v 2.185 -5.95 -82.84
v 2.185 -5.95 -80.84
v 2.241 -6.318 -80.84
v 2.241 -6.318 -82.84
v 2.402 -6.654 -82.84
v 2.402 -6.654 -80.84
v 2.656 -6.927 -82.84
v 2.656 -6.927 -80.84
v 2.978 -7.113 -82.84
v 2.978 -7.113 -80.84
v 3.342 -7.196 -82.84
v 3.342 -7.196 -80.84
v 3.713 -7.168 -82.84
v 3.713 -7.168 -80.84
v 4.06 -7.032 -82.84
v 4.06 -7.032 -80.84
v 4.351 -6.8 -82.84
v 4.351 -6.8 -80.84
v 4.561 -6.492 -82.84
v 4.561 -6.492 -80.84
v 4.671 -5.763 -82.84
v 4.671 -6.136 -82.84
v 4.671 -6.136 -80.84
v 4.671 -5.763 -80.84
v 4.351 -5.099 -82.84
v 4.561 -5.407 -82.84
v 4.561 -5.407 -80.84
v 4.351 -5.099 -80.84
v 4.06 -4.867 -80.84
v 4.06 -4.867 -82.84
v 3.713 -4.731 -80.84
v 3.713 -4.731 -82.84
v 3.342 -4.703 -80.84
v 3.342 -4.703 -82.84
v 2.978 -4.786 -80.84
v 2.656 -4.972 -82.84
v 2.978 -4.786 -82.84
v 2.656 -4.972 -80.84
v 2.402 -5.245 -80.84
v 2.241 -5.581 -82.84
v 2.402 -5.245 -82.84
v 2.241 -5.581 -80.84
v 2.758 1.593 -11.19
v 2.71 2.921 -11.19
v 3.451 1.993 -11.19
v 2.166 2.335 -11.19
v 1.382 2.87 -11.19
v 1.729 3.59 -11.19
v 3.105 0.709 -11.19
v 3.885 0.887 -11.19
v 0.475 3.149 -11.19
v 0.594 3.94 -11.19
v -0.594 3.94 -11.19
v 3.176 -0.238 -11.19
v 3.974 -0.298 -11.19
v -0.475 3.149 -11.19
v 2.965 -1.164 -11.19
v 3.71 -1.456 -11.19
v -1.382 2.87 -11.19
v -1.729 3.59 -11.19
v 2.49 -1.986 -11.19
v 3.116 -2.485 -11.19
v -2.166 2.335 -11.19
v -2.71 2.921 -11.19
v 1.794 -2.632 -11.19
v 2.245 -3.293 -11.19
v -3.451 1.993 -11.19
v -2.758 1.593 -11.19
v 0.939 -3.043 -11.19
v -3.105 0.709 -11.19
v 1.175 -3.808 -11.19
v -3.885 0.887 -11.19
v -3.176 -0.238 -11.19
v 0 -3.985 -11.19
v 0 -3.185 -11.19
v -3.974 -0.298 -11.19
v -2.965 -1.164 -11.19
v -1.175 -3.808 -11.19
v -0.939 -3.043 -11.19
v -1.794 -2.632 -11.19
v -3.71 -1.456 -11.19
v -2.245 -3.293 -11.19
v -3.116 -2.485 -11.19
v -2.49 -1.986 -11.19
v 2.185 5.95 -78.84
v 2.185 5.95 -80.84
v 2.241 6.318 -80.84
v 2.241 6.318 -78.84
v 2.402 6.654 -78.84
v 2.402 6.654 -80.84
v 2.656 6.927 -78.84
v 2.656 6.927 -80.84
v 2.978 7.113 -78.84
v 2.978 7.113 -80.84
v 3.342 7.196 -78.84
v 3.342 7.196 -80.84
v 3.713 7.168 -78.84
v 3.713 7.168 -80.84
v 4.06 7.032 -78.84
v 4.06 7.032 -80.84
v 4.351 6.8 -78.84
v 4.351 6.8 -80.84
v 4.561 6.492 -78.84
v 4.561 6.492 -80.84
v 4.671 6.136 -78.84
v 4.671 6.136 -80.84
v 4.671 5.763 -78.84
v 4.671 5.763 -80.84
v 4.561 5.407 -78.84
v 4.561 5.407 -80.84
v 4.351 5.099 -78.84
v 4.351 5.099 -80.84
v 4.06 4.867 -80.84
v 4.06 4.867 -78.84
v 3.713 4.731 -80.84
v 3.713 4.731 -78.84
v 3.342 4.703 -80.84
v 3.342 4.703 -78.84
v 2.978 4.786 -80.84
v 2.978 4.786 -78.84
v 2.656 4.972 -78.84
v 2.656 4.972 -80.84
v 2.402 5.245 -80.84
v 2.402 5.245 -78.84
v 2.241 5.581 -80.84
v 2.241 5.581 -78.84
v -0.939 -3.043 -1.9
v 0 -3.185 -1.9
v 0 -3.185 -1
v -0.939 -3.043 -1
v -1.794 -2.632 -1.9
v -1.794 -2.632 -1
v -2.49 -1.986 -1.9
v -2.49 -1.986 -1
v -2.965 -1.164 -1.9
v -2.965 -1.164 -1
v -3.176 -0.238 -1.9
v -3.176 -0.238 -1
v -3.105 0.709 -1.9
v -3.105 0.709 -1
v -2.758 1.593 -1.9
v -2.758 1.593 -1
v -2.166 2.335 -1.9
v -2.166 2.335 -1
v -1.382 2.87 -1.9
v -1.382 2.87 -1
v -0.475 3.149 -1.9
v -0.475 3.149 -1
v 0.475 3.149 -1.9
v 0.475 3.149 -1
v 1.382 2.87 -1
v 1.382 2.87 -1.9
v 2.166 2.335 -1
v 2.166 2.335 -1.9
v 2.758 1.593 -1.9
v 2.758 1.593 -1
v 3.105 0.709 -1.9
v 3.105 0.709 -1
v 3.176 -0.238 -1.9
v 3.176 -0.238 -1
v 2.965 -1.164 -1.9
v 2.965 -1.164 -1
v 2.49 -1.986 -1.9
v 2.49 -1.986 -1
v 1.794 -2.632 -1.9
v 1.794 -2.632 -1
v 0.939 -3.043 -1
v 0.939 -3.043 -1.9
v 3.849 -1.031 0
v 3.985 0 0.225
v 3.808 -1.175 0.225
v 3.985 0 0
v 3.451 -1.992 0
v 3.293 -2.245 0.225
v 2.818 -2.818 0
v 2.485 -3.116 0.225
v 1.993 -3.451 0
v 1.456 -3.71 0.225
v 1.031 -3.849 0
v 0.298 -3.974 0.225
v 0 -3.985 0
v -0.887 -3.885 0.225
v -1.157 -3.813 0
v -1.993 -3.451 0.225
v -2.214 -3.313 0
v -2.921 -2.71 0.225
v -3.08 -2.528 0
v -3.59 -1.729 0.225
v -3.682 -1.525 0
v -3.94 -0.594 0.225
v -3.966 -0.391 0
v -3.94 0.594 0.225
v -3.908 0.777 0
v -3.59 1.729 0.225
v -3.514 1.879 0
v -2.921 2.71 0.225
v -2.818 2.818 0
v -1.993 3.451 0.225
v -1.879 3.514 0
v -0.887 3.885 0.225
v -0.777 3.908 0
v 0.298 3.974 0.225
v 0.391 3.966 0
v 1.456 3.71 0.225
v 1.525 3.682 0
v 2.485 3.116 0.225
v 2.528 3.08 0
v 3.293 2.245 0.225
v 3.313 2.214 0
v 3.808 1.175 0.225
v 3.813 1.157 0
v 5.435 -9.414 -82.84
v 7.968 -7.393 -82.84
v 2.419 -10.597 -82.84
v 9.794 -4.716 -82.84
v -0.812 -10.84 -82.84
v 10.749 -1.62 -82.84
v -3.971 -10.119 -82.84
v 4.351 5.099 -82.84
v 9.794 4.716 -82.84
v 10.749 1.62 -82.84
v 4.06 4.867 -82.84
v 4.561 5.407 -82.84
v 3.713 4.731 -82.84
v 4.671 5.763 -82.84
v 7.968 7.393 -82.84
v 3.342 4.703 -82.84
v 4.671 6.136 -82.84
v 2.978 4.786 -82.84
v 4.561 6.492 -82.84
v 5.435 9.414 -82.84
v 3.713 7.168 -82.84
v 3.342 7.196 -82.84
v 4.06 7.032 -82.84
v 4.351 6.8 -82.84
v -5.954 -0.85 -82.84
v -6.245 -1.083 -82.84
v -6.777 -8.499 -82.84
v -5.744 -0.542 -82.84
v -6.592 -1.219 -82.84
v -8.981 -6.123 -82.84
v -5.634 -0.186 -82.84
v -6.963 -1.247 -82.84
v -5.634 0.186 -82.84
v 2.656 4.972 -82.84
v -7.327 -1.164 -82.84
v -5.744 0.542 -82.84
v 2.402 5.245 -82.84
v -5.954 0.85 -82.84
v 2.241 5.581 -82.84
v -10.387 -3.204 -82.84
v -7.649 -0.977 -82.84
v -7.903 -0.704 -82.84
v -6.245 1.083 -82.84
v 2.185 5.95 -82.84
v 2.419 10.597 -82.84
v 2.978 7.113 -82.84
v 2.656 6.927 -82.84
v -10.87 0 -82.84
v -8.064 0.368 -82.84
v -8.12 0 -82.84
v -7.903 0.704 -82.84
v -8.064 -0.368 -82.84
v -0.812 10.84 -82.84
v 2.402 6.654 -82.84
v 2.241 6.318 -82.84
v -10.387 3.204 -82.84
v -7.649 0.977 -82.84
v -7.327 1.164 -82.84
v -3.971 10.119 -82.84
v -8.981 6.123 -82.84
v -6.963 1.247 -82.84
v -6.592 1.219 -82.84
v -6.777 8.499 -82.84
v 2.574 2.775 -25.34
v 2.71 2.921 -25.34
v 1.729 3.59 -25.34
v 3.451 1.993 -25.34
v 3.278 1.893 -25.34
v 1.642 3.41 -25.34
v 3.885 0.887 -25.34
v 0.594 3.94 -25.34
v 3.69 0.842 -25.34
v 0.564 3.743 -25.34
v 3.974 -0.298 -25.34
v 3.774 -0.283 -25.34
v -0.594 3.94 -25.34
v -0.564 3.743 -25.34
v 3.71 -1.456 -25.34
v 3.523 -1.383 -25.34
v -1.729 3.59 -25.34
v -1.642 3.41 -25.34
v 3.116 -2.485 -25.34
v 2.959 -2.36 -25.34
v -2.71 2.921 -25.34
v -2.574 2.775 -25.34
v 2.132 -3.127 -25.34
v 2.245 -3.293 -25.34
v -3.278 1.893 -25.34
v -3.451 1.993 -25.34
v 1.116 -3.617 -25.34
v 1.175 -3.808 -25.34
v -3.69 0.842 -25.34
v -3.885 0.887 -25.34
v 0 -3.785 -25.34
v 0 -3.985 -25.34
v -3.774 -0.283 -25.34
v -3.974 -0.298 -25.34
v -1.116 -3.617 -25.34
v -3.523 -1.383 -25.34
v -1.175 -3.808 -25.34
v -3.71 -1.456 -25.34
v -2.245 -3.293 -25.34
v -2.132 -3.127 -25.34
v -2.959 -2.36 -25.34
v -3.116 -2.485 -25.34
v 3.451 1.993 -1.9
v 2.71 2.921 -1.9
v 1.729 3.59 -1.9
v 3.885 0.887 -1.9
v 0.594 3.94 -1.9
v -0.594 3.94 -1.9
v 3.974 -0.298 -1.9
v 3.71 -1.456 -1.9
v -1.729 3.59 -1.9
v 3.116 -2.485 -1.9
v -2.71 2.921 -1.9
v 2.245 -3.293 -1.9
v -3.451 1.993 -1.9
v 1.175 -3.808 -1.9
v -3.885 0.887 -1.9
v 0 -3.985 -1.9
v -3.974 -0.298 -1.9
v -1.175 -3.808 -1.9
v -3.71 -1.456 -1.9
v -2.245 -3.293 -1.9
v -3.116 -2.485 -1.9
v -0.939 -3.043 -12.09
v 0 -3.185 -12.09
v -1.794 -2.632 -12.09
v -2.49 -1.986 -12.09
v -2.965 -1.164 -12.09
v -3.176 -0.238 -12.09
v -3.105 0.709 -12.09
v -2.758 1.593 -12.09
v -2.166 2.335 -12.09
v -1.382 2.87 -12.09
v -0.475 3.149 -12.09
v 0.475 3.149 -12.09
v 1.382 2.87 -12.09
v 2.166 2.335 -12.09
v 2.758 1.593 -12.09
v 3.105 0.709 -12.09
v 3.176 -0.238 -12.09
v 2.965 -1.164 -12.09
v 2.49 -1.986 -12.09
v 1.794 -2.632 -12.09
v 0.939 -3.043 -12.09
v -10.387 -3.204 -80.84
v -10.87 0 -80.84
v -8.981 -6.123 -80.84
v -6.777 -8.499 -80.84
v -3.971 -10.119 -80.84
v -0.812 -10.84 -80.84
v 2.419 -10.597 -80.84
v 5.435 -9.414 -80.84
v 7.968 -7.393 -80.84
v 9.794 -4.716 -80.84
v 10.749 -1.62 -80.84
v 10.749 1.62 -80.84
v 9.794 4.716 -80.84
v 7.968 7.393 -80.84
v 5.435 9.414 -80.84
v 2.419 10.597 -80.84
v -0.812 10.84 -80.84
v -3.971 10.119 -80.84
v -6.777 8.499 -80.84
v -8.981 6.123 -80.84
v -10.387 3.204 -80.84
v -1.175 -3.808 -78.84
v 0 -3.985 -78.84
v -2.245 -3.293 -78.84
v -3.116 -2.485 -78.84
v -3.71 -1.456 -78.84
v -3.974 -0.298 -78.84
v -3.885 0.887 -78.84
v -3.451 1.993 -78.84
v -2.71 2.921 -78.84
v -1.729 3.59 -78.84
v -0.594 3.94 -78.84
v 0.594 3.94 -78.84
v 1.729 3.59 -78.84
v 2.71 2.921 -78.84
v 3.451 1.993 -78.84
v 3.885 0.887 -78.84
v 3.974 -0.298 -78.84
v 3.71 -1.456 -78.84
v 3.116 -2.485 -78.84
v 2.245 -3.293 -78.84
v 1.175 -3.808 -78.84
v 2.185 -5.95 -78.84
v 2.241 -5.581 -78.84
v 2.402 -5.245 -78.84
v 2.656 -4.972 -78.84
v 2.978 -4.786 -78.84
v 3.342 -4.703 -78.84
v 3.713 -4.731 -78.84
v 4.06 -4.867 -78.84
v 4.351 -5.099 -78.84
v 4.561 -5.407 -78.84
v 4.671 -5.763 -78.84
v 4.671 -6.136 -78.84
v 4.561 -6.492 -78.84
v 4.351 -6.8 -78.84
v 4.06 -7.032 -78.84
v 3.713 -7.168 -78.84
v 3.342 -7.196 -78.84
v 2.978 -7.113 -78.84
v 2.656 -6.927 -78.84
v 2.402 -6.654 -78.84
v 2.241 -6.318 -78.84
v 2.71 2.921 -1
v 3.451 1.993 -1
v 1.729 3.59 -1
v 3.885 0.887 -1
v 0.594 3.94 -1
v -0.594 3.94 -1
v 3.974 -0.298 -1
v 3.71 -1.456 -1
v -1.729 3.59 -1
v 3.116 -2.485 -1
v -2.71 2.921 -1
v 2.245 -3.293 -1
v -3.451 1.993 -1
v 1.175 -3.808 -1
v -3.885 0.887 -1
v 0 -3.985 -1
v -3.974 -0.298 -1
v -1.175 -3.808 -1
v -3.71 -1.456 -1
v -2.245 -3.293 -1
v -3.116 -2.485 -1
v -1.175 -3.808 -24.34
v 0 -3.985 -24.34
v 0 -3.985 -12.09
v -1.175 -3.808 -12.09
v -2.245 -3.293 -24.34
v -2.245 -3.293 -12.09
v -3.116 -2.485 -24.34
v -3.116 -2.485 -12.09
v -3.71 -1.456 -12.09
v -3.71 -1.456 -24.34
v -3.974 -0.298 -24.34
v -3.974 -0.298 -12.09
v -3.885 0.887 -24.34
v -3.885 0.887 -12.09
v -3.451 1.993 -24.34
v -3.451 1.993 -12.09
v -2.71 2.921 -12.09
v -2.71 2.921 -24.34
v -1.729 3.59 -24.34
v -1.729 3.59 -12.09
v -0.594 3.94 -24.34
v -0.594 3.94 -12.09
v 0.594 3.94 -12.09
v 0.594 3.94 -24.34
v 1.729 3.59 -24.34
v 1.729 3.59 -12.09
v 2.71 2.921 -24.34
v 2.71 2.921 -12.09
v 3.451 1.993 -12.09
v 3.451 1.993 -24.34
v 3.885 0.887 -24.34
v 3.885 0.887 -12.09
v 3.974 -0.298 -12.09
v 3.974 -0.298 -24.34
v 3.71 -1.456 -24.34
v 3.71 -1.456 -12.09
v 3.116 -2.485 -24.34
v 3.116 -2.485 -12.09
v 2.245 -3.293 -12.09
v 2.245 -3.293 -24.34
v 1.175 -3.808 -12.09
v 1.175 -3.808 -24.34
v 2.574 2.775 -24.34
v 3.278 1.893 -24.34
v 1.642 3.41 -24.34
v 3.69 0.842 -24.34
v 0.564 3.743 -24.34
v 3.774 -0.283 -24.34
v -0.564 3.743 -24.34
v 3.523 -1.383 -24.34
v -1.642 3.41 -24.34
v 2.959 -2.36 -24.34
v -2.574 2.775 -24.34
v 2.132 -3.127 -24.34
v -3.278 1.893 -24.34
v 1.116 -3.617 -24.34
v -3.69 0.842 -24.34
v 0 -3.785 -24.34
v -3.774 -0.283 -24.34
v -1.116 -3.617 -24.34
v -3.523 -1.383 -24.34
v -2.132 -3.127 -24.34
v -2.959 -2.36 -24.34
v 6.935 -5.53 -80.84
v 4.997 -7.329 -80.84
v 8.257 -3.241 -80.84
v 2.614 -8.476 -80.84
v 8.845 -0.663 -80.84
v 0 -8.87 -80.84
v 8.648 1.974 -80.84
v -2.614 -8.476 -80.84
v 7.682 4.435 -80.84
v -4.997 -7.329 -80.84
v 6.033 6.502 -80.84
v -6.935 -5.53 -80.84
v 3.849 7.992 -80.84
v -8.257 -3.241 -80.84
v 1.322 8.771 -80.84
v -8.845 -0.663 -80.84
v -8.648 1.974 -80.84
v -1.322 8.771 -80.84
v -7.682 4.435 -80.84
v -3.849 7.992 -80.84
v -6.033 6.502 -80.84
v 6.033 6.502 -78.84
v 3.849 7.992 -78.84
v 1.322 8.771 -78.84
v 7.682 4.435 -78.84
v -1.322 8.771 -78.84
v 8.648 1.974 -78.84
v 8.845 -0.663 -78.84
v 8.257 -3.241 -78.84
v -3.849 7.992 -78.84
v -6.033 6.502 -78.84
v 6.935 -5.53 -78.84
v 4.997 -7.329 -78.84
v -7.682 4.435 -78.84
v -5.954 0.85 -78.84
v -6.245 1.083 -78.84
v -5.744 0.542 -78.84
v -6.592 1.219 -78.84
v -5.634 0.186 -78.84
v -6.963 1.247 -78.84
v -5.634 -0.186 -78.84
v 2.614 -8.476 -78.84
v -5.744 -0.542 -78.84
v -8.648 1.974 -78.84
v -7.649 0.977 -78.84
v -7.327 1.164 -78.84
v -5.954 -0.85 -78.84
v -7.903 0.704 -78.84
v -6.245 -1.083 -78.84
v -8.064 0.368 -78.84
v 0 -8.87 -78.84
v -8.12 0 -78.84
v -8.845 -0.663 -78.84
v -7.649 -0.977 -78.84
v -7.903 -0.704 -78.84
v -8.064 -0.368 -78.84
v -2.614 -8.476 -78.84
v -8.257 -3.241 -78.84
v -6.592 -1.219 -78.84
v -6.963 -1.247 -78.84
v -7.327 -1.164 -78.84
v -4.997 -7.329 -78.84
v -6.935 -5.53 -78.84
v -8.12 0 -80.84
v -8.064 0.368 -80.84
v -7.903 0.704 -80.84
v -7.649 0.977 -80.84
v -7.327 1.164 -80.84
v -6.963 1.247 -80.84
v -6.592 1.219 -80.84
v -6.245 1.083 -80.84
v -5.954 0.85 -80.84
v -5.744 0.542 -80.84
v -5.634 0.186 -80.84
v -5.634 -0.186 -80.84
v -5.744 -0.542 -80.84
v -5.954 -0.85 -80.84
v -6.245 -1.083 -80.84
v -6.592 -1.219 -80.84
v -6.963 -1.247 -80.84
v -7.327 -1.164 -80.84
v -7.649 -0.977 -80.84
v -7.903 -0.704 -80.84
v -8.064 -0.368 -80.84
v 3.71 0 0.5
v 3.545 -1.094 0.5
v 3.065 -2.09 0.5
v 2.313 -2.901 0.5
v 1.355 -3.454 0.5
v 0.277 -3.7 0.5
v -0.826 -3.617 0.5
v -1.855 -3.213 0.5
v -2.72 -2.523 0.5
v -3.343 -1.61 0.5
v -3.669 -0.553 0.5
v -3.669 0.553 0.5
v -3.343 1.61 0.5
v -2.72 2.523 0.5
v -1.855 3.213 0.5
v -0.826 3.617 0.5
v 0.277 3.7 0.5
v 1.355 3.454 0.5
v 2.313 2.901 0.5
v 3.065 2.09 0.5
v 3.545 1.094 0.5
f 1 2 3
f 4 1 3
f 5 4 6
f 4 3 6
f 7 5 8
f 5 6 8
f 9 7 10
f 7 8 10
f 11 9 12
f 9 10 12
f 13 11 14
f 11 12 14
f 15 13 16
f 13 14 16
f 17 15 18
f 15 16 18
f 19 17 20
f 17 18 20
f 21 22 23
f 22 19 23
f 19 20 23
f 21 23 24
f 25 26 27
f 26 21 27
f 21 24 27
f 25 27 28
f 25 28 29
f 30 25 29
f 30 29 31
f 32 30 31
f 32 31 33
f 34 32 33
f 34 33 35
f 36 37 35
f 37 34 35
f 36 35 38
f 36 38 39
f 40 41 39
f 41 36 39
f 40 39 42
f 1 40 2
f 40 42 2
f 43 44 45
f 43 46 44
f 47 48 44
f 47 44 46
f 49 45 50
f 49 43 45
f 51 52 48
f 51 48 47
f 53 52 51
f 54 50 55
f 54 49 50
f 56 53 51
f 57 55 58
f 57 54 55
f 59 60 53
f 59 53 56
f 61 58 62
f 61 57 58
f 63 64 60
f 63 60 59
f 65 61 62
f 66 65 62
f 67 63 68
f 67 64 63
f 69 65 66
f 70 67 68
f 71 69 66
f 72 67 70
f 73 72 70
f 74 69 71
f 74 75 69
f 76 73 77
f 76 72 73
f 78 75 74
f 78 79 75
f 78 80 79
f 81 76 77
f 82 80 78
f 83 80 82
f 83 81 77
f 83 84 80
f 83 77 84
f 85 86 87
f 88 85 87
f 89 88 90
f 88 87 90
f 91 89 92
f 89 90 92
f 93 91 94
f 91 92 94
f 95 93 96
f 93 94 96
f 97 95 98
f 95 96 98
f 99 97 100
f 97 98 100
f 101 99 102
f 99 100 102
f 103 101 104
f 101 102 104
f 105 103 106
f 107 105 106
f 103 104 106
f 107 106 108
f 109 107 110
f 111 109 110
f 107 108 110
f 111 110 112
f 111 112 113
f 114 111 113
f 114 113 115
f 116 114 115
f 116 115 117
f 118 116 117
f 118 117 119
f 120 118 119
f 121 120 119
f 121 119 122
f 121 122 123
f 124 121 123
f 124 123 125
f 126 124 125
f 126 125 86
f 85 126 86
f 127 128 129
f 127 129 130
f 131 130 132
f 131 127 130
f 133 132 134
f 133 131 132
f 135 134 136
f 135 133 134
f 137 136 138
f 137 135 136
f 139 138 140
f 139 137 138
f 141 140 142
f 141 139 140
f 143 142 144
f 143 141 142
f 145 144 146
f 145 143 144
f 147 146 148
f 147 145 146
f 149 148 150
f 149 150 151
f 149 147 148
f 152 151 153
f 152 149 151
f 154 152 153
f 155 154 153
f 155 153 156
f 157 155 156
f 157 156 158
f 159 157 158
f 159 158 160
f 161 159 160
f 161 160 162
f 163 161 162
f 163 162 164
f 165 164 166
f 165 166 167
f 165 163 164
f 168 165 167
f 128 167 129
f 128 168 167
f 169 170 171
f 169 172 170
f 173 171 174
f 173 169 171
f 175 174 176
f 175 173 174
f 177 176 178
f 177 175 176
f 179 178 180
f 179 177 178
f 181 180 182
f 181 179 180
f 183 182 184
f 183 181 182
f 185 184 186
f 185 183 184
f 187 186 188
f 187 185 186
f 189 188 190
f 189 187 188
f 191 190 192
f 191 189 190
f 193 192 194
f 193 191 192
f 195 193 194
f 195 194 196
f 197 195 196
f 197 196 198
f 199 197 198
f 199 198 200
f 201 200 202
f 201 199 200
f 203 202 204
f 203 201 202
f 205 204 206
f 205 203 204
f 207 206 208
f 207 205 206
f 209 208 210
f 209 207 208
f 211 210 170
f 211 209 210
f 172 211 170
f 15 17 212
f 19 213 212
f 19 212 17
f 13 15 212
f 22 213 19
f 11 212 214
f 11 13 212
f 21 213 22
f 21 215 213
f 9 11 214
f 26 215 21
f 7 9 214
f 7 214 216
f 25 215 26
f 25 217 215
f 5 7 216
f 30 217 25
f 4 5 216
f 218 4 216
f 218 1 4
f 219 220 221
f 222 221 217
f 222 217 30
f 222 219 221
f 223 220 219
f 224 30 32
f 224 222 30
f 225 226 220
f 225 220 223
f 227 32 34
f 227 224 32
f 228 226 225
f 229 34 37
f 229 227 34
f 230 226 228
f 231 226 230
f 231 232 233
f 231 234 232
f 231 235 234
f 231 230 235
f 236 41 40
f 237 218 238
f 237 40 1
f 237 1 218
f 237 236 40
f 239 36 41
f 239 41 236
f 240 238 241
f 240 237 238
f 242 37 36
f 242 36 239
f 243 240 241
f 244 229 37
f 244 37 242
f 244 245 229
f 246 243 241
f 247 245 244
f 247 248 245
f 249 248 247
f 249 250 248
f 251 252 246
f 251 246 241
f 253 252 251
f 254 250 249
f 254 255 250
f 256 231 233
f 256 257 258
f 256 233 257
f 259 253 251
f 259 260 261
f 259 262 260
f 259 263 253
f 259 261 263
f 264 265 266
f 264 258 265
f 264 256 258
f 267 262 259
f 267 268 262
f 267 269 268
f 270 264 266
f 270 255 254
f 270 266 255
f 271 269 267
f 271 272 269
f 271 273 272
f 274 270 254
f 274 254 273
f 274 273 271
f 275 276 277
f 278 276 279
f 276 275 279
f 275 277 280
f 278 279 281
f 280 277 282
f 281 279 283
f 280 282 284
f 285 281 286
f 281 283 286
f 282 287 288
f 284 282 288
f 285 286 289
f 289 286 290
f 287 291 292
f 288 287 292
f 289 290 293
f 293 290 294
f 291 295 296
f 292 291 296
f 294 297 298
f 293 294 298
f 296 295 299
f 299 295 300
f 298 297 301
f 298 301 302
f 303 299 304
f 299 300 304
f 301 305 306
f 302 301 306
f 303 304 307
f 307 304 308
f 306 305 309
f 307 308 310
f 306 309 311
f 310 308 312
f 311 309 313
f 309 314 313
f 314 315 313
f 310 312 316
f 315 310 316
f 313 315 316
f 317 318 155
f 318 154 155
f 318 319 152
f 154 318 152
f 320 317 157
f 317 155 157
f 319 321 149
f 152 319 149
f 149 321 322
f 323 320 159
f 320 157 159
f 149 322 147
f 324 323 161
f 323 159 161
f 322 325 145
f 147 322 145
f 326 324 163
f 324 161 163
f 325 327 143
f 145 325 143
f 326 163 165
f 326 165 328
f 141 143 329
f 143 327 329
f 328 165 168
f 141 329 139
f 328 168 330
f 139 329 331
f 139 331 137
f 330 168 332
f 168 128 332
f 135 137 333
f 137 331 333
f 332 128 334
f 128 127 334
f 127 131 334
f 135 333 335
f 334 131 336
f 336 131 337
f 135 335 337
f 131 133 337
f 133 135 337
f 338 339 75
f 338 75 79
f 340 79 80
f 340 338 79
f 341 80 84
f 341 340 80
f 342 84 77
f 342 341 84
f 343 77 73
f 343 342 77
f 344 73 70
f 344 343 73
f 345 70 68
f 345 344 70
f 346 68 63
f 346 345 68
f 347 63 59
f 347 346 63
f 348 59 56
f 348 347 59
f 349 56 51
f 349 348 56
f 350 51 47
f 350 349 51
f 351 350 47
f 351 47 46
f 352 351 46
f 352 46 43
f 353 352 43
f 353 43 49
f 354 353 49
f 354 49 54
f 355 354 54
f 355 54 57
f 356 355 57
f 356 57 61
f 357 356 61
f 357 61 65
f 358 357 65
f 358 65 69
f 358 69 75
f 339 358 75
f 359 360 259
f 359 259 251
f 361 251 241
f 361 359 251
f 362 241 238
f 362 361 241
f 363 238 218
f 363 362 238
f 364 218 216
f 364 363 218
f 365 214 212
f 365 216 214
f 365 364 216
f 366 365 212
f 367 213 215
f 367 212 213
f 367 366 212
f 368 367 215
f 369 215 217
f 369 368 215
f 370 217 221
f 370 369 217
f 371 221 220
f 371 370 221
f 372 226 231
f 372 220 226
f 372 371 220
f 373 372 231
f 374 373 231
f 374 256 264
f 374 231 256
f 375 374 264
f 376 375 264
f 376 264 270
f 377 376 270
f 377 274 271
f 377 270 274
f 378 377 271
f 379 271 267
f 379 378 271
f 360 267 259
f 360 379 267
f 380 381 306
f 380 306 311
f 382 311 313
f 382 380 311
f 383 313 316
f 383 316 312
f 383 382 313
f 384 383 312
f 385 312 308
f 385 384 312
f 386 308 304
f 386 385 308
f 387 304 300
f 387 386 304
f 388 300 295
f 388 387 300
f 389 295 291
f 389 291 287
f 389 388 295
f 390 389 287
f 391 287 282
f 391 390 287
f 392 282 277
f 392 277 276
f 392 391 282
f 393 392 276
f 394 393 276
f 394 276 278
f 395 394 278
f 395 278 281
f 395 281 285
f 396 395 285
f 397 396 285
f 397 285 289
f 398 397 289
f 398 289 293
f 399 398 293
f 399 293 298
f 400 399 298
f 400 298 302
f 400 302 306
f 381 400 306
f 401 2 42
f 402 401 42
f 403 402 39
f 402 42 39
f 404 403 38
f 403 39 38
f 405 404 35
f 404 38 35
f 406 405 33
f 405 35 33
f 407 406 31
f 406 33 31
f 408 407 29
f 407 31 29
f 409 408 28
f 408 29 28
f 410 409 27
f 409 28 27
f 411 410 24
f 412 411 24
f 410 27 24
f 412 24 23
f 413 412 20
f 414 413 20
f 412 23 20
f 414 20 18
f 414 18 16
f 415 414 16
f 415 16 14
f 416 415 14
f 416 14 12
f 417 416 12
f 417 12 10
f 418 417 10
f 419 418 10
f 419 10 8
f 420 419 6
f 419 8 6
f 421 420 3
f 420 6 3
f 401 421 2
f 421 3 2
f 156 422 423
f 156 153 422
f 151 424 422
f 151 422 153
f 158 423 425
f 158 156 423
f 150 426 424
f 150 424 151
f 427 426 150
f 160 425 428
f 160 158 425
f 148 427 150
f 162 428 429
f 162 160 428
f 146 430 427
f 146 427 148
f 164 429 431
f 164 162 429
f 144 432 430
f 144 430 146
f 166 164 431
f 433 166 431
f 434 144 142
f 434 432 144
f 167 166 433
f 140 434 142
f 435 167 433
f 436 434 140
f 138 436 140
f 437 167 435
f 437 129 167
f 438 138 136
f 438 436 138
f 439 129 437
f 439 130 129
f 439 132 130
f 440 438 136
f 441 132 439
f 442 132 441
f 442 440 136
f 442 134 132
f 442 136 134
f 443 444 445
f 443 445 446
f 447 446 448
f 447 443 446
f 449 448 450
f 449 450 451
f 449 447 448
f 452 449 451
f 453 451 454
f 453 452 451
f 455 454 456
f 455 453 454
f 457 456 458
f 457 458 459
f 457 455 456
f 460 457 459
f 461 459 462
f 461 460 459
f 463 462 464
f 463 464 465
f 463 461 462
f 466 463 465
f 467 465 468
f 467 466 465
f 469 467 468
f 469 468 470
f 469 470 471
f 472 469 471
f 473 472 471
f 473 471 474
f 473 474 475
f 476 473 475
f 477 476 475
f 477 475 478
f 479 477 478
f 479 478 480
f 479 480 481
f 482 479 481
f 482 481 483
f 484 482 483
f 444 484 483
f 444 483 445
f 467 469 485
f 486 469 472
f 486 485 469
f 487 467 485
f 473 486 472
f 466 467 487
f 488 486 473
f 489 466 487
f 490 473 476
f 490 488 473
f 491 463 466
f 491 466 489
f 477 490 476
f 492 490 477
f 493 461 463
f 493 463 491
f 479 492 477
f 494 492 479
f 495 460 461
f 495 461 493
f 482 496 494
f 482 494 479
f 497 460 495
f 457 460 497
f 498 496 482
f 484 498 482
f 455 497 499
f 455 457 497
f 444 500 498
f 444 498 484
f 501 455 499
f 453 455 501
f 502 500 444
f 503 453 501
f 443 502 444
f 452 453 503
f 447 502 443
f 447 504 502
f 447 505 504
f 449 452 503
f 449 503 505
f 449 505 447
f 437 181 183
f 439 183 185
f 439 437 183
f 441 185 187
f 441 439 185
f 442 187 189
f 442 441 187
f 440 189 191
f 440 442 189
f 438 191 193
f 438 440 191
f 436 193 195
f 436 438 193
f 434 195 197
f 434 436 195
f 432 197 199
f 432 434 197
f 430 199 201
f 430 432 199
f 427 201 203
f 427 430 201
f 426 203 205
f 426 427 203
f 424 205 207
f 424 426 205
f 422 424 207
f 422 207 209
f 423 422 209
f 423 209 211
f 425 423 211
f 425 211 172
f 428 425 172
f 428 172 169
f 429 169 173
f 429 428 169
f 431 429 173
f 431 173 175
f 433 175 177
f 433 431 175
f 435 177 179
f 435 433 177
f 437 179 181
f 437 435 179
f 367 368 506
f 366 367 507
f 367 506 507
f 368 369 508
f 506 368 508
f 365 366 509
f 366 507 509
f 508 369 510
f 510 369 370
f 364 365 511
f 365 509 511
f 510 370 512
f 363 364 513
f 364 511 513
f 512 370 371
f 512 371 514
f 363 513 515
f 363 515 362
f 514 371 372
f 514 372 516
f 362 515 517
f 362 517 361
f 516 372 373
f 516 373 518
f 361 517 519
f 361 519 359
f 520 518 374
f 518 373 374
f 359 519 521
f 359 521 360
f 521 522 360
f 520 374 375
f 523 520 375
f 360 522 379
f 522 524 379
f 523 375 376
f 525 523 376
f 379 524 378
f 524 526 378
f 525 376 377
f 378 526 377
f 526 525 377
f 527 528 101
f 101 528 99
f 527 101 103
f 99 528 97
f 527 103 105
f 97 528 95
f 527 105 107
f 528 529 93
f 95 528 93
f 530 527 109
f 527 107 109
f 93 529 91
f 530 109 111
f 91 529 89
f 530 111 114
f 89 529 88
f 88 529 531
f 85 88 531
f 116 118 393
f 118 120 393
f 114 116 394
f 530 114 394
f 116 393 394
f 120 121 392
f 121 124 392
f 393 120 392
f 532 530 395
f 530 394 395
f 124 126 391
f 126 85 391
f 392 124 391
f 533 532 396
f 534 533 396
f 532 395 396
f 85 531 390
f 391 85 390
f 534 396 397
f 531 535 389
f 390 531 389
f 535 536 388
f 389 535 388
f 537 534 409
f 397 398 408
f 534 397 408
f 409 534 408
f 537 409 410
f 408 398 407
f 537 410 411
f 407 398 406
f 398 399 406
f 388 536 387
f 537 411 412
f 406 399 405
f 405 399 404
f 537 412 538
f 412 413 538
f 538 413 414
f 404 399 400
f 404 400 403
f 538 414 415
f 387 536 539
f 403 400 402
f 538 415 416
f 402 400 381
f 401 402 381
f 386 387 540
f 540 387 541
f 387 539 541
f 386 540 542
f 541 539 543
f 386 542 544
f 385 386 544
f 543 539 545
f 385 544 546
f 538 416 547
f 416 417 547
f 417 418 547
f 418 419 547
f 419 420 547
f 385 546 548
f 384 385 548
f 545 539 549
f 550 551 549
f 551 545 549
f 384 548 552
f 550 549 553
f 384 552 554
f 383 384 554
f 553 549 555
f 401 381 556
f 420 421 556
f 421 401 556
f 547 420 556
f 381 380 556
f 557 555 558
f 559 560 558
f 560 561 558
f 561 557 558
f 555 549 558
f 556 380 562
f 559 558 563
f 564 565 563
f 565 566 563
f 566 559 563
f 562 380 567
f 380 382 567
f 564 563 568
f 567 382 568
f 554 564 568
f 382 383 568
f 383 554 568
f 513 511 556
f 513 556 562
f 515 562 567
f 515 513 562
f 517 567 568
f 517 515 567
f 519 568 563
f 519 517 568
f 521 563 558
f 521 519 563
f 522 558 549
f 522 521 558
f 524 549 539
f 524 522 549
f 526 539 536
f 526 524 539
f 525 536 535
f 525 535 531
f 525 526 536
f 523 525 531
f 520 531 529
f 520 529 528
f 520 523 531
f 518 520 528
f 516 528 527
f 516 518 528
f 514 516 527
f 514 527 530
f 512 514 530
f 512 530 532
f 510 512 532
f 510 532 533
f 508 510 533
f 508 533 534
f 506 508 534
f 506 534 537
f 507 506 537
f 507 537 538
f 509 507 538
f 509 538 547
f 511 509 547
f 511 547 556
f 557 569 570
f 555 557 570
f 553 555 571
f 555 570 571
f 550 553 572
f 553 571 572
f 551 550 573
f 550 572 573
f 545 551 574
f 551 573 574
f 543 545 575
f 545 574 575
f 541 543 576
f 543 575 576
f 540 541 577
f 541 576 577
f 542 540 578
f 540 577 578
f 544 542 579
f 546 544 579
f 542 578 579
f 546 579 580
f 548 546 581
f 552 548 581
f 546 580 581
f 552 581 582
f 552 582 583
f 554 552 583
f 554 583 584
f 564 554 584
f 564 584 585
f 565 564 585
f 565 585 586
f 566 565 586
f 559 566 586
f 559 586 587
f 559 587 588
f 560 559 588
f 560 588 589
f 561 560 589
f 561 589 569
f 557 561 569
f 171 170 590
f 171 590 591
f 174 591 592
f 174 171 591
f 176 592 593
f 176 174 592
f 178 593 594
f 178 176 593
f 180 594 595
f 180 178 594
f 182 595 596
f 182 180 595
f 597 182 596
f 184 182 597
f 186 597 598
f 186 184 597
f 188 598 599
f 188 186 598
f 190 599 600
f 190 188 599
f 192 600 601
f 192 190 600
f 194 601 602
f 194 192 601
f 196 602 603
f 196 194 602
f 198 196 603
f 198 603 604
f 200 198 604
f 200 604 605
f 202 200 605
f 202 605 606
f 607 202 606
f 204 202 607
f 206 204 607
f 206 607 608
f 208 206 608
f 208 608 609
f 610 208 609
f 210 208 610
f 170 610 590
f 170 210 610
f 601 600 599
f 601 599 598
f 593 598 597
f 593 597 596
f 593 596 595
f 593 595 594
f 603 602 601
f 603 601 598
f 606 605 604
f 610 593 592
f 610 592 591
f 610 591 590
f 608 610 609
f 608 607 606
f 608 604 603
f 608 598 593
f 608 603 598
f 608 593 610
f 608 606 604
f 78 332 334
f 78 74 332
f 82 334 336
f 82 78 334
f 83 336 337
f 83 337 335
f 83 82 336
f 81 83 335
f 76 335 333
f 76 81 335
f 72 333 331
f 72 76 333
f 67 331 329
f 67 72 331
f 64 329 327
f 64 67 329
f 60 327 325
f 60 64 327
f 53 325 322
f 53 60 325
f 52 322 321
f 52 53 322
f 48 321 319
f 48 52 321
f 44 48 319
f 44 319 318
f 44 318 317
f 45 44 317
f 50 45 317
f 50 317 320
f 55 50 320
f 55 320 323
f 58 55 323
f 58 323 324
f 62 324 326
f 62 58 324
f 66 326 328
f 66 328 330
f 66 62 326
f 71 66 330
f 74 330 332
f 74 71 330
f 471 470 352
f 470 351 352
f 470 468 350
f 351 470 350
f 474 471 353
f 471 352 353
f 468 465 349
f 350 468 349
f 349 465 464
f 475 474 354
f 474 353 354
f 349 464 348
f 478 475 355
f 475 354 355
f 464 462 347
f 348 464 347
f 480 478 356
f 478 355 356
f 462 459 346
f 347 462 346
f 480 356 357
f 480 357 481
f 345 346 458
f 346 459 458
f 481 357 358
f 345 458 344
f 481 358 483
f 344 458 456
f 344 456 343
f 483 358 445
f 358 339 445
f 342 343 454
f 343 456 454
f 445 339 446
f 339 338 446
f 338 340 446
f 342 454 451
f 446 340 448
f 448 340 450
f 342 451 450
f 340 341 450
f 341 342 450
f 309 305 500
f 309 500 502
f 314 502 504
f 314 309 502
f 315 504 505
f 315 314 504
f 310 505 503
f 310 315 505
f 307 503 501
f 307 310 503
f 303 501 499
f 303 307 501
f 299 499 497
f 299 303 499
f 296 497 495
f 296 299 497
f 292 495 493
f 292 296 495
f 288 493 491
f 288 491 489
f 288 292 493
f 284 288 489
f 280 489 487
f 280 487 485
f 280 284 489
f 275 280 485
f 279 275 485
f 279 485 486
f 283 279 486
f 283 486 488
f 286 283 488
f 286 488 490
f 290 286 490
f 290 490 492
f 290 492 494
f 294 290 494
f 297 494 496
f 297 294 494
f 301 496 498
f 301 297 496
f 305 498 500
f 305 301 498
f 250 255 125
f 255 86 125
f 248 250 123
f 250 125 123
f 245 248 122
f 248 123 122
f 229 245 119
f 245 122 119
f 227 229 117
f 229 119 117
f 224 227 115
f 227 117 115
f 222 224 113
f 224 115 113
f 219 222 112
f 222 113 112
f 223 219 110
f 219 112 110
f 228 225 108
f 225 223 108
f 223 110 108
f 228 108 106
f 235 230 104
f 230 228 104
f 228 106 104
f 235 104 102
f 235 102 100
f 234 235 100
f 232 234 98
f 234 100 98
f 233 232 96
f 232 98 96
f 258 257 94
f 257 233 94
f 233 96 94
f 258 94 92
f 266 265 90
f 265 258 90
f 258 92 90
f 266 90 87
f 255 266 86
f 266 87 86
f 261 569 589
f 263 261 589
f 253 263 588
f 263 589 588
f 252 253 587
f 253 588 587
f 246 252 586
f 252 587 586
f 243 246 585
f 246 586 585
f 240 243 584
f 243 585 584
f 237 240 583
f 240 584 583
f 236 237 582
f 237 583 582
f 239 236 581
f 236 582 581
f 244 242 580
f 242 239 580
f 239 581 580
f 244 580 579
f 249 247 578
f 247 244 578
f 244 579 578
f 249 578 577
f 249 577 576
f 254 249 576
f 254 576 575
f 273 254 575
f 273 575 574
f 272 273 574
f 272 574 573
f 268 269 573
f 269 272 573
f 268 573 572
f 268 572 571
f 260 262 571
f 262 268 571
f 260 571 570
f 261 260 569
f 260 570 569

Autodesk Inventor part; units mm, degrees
ref_plane "YZ Plane" through (0, 0, 0) normal (1, 0, 0) x (0, 1, 0)
ref_plane "XZ Plane" through (0, 0, 0) normal (0, 1, 0) x (-1, 0, 0)
ref_plane "XY Plane" through (0, 0, 0) normal (0, 0, 1) x (1, 0, 0)
sketch "Sketch2" plane through (0, 0, 0) normal (1, 0, 0) x (0, 1, 0)
  line L0 (0, 0) -> (-3.985, 0)
  line L1 (0, -80.84) -> (0.015, -80.84)
  line L2 (-8.87, -80.84) -> (0, -80.84)
  line L3 (-3.985, -78.84) -> (-8.87, -78.84)
  line L4 (-8.87, -78.84) -> (-8.87, -80.84)
  line L5 (-3.985, -24.34) -> (-3.785, -24.34)
  line L6 (-3.785, -24.34) -> (-3.785, -25.34)
  line L7 (-3.785, -25.34) -> (-3.985, -25.34)
  line L8 (-3.985, -25.34) -> (-3.985, -24.34)
  line L9 (0, 0) -> (0, -80.84)
  line L10 (-6.435, 0) -> (-6.435, -12.64) construction
  line L11 (-6.435, -12.64) -> (0, -12.64) construction
  line L12 (-3.985, 0) -> (-3.985, -24.34)
  line L13 (-3.985, -25.34) -> (-3.985, -78.84)
  line L14 (0, 0) -> (0, -80.84)
  line L15 (-3.985, -1) -> (-3.185, -1)
  line L16 (-3.185, -1) -> (-3.185, -1.9)
  line L17 (-3.185, -1.9) -> (-3.985, -1.9)
  line L18 (-3.985, -1.9) -> (-3.985, -1)
  line L19 (2.8591, -2.1) -> (-4.9211, -2.1) construction
  line L20 (-4.9211, -2.1) -> (-4.9211, -10.99) construction
  line L21 (-4.9211, -10.99) -> (2.8591, -10.99) construction
  line L22 (2.8591, -10.99) -> (2.8591, -2.1) construction
  line L23 (-3.985, -11.19) -> (-3.185, -11.19)
  line L24 (-3.185, -11.19) -> (-3.185, -12.09)
  line L25 (-3.185, -12.09) -> (-3.985, -12.09)
  line L26 (-3.985, -12.09) -> (-3.985, -11.19)
  point P0 (-8.87, -79.84)
  point P1 (-4.9211, -6.545)
  point P2 (-3.585, -1)
  point P3 (-3.985, -12.09)
  dimension "d3" = 1
  dimension "d5" = 0.2
  dimension "d18" = 55.5
  dimension "d21" = 2
  dimension "d22" = 17.74
  dimension "d24" = 12.64
  dimension "d25" = 6.435
  dimension "d26" = 12.7
  dimension "d35" = 0.9
  dimension "d36" = 0.8
  dimension "d38" = 8.89
  dimension "d39" = 0.2
  dimension "d40" = 1
  dimension "d41" = 3.985
  dimension "d45" = 0.2
revolve "Revolution1" add sketch "Sketch2" angle 360 about axis through (0, 0, 0) along (0, 0, -1) contours L9 L2 L4 L3 L13 L7 L6 L5 L12 L25 L24 L23 L17 L16 L15 L0
sketch "Sketch4" plane through (0, 0, -80.84) normal (0, 0, -1) x (-1, 0, 0)
  circle A0 centre (0, 0) radius 6.87 construction
  circle A1 centre (6.87, 0) radius 1.25
  circle A2 centre (0, 0) radius 8.87 projected
  circle A3 centre (-3.435, 5.9496) radius 1.25
  circle A4 centre (-3.435, -5.9496) radius 1.25
  dimension "d28" = 2.5
  dimension "d46" = 2
  dimension "d49" = 360
extrude "Extrusion2" cut sketch "Sketch4" against normal through all contours A1 | A3 | A4
sketch "Sketch5" plane through (0, 0, -80.84) normal (0, 0, -1) x (-1, 0, 0)
  circle A0 centre (6.87, 0) radius 1.25 projected
  circle A1 centre (-3.435, -5.9496) radius 1.25 projected
  circle A2 centre (-3.435, 5.9496) radius 1.25 projected
  circle A3 centre (0, 0) radius 8.87 projected
  circle A4 centre (0, 0) radius 10.87
  dimension "d51" = 2
extrude "Extrusion3" add sketch "Sketch5" along normal blind 2 contours A3 | A4
sketch "Sketch6" plane through (0, 0, 0) normal (0, 0, 1) x (1, 0, 0)
  circle A0 centre (0, 0) radius 3.985 projected
extrude "Extrusion4" add sketch "Sketch6" along normal blind 0.5
chamfer "Chamfer2" distance 0.275 angle 45 1 edges at (-3.985, 0, 0.5)
equation "\"d45\" = d39"
properties part number "FlipperH5055RoundShaft"
